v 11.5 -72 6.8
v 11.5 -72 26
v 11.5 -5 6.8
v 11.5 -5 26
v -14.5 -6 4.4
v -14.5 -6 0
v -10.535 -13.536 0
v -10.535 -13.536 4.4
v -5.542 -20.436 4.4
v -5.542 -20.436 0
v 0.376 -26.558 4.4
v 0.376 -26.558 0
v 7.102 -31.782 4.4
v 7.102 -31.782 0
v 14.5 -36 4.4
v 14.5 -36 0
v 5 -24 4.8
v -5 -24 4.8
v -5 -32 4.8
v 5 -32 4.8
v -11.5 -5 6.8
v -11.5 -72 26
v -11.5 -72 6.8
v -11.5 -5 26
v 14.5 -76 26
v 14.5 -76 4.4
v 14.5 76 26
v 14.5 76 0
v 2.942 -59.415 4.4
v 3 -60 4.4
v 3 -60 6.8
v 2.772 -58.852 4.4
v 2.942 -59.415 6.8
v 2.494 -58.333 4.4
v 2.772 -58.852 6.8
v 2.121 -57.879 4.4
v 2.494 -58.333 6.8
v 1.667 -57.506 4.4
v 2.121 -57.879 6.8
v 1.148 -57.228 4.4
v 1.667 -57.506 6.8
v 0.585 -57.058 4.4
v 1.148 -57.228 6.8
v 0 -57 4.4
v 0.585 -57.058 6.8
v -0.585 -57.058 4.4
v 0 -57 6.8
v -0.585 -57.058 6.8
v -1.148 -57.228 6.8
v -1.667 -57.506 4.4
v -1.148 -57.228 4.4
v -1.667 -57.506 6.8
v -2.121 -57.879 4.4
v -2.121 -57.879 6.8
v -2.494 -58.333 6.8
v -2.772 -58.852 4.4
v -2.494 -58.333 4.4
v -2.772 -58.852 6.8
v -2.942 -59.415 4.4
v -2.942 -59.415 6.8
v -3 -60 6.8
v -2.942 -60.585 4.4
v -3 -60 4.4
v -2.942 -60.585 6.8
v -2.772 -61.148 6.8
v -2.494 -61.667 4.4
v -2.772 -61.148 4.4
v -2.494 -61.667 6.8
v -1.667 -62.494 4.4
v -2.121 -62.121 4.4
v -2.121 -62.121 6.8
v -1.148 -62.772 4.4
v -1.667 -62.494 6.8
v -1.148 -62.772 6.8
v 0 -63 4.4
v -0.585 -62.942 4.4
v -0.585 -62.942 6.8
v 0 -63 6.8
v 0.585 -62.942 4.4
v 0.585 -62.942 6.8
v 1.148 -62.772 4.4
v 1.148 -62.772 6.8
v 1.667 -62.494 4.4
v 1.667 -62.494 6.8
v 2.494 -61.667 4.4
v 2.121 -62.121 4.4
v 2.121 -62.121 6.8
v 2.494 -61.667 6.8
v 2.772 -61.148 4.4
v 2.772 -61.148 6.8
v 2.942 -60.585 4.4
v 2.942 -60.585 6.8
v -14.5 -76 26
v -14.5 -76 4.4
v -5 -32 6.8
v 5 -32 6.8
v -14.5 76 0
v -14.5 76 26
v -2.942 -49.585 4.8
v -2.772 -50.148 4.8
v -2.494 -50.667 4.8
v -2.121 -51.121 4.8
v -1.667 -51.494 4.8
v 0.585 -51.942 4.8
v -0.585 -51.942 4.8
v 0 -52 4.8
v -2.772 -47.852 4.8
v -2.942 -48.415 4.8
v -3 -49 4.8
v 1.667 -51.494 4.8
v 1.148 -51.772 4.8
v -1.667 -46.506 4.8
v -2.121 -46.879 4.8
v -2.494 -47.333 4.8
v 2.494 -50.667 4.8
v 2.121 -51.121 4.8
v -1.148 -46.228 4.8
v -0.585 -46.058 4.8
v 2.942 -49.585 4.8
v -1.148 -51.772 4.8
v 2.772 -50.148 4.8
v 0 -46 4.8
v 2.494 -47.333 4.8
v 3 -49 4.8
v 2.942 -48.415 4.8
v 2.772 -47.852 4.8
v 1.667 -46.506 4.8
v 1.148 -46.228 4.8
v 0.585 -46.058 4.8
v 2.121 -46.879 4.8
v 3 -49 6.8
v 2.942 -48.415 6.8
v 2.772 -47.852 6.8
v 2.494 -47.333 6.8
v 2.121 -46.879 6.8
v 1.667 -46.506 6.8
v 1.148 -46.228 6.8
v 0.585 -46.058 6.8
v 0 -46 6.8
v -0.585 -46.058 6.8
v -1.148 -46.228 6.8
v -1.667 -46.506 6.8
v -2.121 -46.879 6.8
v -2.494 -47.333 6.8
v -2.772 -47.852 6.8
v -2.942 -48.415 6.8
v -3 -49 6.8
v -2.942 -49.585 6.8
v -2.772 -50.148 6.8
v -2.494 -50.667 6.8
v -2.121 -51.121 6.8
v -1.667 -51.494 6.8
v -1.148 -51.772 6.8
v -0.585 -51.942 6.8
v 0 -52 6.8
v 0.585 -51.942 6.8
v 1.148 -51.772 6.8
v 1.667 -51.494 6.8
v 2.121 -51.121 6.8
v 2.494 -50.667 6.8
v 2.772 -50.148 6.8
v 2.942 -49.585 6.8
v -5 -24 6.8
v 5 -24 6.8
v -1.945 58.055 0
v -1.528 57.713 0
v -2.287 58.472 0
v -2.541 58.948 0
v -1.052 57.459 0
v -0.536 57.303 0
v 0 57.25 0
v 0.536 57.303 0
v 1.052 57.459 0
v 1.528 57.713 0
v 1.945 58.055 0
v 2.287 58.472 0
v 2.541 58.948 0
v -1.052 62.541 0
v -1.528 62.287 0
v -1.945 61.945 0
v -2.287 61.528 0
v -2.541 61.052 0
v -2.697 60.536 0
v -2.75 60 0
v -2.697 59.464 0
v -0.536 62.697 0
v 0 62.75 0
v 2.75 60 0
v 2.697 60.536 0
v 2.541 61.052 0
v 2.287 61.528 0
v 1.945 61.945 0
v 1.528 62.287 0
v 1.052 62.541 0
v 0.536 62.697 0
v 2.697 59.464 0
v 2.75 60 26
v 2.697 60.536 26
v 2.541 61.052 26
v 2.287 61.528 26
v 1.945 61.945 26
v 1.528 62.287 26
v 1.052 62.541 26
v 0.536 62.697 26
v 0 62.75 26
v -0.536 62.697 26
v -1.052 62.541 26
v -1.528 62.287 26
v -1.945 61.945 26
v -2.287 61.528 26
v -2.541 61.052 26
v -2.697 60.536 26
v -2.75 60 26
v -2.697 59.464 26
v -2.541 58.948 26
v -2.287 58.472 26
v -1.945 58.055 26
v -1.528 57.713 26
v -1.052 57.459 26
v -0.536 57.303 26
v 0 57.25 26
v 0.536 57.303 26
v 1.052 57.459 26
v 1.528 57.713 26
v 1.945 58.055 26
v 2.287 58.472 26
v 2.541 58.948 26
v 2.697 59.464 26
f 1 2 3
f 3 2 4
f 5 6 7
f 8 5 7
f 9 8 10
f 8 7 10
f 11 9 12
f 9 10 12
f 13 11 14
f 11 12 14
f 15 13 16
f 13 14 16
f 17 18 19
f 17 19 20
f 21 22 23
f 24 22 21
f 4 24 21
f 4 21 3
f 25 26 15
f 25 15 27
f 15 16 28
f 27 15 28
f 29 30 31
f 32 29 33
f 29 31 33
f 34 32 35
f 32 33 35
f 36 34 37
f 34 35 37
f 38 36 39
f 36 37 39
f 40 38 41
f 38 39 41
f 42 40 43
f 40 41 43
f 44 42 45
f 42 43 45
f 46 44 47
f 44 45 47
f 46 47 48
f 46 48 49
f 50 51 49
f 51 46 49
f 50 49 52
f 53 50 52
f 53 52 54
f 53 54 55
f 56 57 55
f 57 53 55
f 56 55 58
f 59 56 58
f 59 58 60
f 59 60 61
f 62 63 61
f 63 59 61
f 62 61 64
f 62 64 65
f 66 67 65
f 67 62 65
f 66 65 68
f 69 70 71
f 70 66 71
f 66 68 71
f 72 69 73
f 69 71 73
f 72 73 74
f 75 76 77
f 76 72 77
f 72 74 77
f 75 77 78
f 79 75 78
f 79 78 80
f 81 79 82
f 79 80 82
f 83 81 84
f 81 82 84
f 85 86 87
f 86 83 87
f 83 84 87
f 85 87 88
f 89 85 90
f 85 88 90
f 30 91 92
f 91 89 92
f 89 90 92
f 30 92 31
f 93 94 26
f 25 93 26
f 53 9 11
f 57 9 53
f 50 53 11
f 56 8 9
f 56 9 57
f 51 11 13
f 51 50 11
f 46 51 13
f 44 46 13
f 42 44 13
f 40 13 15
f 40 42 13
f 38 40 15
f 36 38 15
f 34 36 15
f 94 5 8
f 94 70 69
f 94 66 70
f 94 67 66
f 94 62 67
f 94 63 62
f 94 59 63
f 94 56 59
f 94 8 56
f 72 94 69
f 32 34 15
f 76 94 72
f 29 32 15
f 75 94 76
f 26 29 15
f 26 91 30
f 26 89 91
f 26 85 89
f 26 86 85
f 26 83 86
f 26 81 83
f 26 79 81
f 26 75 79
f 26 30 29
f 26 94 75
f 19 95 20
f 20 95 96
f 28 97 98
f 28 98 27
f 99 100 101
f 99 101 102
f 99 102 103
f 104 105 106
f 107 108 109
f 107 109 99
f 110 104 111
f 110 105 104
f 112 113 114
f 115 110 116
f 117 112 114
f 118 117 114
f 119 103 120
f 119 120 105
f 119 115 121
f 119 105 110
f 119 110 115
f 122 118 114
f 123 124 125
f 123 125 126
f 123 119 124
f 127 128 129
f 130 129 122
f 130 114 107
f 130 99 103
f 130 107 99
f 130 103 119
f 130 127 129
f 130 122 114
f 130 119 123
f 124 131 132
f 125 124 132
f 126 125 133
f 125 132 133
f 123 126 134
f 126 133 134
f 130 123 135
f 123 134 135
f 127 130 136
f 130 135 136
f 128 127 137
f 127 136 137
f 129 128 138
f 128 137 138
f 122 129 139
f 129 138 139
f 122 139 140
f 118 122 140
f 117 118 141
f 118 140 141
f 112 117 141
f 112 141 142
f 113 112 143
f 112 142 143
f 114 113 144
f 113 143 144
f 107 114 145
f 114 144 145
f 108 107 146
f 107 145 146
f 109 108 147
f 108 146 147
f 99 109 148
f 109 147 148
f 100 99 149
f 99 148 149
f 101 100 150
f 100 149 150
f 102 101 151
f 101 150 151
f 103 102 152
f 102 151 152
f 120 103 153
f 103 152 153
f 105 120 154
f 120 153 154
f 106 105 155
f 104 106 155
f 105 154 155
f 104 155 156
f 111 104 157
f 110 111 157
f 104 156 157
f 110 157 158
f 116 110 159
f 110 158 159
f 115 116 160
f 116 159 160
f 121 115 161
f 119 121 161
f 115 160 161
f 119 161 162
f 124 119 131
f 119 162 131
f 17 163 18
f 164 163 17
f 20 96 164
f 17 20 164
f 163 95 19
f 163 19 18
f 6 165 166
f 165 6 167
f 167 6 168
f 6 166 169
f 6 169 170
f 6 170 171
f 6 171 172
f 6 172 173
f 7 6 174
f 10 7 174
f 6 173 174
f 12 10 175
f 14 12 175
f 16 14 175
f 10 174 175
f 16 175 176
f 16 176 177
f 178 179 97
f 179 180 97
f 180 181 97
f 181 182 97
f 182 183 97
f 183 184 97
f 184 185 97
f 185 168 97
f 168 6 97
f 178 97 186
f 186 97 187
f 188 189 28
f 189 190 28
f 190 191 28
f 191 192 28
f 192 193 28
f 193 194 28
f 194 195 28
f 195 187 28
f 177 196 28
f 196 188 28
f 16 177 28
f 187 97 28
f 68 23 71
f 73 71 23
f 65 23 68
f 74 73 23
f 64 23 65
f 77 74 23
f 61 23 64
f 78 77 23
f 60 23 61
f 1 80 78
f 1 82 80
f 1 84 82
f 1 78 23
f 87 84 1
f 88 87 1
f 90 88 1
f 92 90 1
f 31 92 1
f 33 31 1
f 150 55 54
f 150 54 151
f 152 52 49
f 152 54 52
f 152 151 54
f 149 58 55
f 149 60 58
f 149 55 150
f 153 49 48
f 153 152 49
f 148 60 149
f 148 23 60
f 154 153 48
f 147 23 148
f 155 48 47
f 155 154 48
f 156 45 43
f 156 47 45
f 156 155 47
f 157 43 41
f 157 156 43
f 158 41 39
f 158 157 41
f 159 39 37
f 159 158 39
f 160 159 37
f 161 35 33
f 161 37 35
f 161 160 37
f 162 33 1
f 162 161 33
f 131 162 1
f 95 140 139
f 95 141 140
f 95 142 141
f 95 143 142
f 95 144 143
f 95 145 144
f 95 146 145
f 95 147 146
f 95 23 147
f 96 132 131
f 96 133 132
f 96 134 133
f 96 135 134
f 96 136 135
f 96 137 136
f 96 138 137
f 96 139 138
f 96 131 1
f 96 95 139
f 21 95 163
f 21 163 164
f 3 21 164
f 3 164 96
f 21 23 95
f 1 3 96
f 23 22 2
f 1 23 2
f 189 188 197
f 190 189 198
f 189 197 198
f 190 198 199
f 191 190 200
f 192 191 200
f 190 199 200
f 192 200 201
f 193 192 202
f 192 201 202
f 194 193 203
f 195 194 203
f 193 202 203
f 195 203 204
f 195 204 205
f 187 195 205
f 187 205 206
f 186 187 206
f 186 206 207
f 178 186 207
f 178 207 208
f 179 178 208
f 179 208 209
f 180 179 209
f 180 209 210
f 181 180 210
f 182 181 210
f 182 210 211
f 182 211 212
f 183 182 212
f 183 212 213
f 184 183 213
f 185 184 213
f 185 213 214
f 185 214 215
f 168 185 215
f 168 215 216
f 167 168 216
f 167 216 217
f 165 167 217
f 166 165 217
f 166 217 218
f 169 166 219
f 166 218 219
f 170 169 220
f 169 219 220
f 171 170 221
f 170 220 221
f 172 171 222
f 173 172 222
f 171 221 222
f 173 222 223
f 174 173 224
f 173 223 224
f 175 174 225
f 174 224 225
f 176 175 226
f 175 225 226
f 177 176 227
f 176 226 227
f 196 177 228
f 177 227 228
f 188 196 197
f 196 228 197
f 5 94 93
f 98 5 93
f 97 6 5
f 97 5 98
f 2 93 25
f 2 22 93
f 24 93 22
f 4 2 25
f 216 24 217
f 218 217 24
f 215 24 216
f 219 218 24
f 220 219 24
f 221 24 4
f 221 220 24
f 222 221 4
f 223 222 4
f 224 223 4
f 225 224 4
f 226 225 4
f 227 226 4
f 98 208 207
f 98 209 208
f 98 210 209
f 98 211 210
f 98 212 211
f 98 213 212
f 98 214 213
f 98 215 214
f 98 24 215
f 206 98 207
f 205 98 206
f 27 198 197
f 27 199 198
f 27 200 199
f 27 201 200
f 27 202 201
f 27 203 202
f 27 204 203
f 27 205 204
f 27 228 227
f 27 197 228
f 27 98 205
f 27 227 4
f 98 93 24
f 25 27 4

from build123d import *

# Parameters (mm, degrees)
F0_W     = 29
F0_H     = 152
F1_DEPTH = 26
F2_R     = 3
F2_R_2   = 2.75
F3_DEPTH = 26.001
F4_W     = 23
F4_H     = 67
F4_R     = 3
F5_DEPTH = 19.2
F6_W     = 10
F6_H     = 8
F6_R     = 3
F7_DEPTH = 2
F8_W     = 29
F8_H     = 40
F8_R     = 3
F9_DEPTH = 4.4


with BuildPart() as f1:
    # F0 (on Top) → F1 (new body)
    with BuildSketch(Plane.XY):
        Rectangle(F0_W, F0_H)
    extrude(amount=F1_DEPTH)

    # F2 (on face) → F3 (cut, through all)
    with BuildSketch(Plane.XY.offset(26)):
        with Locations((0, -60)):
            Circle(F2_R)
        with Locations((0, 60)):
            Circle(F2_R_2)
    extrude(amount=-F3_DEPTH, mode=Mode.SUBTRACT)

    # F4 (on face) → F5 (cut)
    with BuildSketch(Plane.XY.offset(26)):
        with Locations((0, -38.5)):
            Rectangle(F4_W, F4_H)
        with Locations((0, -60)):
            Circle(F4_R, mode=Mode.SUBTRACT)
    extrude(amount=-F5_DEPTH, mode=Mode.SUBTRACT)

    # F6 (on face) → F7 (cut)
    with BuildSketch(Plane.XY.offset(6.8)):
        with Locations((0, -28)):
            Rectangle(F6_W, F6_H)
        with Locations((0, -49)):
            Circle(F6_R)
    extrude(amount=-F7_DEPTH, mode=Mode.SUBTRACT)

    # F8 (on face) → F9 (cut)
    with BuildSketch(Plane(origin=(0, 0, 0), x_dir=(1, 0, 0), z_dir=(0, 0, -1))):
        with Locations((0, 56)):
            Rectangle(F8_W, F8_H)
        with Locations((0, 60)):
            Circle(F8_R, mode=Mode.SUBTRACT)
        with BuildLine():
            ThreePointArc((-14.5, 6), (-2.691813, 23.602086), (14.5, 36))
            Line((14.5, 36), (-14.5, 36))
            Line((-14.5, 36), (-14.5, 6))
        make_face()
    extrude(amount=-F9_DEPTH, mode=Mode.SUBTRACT)


solid = f1.part
